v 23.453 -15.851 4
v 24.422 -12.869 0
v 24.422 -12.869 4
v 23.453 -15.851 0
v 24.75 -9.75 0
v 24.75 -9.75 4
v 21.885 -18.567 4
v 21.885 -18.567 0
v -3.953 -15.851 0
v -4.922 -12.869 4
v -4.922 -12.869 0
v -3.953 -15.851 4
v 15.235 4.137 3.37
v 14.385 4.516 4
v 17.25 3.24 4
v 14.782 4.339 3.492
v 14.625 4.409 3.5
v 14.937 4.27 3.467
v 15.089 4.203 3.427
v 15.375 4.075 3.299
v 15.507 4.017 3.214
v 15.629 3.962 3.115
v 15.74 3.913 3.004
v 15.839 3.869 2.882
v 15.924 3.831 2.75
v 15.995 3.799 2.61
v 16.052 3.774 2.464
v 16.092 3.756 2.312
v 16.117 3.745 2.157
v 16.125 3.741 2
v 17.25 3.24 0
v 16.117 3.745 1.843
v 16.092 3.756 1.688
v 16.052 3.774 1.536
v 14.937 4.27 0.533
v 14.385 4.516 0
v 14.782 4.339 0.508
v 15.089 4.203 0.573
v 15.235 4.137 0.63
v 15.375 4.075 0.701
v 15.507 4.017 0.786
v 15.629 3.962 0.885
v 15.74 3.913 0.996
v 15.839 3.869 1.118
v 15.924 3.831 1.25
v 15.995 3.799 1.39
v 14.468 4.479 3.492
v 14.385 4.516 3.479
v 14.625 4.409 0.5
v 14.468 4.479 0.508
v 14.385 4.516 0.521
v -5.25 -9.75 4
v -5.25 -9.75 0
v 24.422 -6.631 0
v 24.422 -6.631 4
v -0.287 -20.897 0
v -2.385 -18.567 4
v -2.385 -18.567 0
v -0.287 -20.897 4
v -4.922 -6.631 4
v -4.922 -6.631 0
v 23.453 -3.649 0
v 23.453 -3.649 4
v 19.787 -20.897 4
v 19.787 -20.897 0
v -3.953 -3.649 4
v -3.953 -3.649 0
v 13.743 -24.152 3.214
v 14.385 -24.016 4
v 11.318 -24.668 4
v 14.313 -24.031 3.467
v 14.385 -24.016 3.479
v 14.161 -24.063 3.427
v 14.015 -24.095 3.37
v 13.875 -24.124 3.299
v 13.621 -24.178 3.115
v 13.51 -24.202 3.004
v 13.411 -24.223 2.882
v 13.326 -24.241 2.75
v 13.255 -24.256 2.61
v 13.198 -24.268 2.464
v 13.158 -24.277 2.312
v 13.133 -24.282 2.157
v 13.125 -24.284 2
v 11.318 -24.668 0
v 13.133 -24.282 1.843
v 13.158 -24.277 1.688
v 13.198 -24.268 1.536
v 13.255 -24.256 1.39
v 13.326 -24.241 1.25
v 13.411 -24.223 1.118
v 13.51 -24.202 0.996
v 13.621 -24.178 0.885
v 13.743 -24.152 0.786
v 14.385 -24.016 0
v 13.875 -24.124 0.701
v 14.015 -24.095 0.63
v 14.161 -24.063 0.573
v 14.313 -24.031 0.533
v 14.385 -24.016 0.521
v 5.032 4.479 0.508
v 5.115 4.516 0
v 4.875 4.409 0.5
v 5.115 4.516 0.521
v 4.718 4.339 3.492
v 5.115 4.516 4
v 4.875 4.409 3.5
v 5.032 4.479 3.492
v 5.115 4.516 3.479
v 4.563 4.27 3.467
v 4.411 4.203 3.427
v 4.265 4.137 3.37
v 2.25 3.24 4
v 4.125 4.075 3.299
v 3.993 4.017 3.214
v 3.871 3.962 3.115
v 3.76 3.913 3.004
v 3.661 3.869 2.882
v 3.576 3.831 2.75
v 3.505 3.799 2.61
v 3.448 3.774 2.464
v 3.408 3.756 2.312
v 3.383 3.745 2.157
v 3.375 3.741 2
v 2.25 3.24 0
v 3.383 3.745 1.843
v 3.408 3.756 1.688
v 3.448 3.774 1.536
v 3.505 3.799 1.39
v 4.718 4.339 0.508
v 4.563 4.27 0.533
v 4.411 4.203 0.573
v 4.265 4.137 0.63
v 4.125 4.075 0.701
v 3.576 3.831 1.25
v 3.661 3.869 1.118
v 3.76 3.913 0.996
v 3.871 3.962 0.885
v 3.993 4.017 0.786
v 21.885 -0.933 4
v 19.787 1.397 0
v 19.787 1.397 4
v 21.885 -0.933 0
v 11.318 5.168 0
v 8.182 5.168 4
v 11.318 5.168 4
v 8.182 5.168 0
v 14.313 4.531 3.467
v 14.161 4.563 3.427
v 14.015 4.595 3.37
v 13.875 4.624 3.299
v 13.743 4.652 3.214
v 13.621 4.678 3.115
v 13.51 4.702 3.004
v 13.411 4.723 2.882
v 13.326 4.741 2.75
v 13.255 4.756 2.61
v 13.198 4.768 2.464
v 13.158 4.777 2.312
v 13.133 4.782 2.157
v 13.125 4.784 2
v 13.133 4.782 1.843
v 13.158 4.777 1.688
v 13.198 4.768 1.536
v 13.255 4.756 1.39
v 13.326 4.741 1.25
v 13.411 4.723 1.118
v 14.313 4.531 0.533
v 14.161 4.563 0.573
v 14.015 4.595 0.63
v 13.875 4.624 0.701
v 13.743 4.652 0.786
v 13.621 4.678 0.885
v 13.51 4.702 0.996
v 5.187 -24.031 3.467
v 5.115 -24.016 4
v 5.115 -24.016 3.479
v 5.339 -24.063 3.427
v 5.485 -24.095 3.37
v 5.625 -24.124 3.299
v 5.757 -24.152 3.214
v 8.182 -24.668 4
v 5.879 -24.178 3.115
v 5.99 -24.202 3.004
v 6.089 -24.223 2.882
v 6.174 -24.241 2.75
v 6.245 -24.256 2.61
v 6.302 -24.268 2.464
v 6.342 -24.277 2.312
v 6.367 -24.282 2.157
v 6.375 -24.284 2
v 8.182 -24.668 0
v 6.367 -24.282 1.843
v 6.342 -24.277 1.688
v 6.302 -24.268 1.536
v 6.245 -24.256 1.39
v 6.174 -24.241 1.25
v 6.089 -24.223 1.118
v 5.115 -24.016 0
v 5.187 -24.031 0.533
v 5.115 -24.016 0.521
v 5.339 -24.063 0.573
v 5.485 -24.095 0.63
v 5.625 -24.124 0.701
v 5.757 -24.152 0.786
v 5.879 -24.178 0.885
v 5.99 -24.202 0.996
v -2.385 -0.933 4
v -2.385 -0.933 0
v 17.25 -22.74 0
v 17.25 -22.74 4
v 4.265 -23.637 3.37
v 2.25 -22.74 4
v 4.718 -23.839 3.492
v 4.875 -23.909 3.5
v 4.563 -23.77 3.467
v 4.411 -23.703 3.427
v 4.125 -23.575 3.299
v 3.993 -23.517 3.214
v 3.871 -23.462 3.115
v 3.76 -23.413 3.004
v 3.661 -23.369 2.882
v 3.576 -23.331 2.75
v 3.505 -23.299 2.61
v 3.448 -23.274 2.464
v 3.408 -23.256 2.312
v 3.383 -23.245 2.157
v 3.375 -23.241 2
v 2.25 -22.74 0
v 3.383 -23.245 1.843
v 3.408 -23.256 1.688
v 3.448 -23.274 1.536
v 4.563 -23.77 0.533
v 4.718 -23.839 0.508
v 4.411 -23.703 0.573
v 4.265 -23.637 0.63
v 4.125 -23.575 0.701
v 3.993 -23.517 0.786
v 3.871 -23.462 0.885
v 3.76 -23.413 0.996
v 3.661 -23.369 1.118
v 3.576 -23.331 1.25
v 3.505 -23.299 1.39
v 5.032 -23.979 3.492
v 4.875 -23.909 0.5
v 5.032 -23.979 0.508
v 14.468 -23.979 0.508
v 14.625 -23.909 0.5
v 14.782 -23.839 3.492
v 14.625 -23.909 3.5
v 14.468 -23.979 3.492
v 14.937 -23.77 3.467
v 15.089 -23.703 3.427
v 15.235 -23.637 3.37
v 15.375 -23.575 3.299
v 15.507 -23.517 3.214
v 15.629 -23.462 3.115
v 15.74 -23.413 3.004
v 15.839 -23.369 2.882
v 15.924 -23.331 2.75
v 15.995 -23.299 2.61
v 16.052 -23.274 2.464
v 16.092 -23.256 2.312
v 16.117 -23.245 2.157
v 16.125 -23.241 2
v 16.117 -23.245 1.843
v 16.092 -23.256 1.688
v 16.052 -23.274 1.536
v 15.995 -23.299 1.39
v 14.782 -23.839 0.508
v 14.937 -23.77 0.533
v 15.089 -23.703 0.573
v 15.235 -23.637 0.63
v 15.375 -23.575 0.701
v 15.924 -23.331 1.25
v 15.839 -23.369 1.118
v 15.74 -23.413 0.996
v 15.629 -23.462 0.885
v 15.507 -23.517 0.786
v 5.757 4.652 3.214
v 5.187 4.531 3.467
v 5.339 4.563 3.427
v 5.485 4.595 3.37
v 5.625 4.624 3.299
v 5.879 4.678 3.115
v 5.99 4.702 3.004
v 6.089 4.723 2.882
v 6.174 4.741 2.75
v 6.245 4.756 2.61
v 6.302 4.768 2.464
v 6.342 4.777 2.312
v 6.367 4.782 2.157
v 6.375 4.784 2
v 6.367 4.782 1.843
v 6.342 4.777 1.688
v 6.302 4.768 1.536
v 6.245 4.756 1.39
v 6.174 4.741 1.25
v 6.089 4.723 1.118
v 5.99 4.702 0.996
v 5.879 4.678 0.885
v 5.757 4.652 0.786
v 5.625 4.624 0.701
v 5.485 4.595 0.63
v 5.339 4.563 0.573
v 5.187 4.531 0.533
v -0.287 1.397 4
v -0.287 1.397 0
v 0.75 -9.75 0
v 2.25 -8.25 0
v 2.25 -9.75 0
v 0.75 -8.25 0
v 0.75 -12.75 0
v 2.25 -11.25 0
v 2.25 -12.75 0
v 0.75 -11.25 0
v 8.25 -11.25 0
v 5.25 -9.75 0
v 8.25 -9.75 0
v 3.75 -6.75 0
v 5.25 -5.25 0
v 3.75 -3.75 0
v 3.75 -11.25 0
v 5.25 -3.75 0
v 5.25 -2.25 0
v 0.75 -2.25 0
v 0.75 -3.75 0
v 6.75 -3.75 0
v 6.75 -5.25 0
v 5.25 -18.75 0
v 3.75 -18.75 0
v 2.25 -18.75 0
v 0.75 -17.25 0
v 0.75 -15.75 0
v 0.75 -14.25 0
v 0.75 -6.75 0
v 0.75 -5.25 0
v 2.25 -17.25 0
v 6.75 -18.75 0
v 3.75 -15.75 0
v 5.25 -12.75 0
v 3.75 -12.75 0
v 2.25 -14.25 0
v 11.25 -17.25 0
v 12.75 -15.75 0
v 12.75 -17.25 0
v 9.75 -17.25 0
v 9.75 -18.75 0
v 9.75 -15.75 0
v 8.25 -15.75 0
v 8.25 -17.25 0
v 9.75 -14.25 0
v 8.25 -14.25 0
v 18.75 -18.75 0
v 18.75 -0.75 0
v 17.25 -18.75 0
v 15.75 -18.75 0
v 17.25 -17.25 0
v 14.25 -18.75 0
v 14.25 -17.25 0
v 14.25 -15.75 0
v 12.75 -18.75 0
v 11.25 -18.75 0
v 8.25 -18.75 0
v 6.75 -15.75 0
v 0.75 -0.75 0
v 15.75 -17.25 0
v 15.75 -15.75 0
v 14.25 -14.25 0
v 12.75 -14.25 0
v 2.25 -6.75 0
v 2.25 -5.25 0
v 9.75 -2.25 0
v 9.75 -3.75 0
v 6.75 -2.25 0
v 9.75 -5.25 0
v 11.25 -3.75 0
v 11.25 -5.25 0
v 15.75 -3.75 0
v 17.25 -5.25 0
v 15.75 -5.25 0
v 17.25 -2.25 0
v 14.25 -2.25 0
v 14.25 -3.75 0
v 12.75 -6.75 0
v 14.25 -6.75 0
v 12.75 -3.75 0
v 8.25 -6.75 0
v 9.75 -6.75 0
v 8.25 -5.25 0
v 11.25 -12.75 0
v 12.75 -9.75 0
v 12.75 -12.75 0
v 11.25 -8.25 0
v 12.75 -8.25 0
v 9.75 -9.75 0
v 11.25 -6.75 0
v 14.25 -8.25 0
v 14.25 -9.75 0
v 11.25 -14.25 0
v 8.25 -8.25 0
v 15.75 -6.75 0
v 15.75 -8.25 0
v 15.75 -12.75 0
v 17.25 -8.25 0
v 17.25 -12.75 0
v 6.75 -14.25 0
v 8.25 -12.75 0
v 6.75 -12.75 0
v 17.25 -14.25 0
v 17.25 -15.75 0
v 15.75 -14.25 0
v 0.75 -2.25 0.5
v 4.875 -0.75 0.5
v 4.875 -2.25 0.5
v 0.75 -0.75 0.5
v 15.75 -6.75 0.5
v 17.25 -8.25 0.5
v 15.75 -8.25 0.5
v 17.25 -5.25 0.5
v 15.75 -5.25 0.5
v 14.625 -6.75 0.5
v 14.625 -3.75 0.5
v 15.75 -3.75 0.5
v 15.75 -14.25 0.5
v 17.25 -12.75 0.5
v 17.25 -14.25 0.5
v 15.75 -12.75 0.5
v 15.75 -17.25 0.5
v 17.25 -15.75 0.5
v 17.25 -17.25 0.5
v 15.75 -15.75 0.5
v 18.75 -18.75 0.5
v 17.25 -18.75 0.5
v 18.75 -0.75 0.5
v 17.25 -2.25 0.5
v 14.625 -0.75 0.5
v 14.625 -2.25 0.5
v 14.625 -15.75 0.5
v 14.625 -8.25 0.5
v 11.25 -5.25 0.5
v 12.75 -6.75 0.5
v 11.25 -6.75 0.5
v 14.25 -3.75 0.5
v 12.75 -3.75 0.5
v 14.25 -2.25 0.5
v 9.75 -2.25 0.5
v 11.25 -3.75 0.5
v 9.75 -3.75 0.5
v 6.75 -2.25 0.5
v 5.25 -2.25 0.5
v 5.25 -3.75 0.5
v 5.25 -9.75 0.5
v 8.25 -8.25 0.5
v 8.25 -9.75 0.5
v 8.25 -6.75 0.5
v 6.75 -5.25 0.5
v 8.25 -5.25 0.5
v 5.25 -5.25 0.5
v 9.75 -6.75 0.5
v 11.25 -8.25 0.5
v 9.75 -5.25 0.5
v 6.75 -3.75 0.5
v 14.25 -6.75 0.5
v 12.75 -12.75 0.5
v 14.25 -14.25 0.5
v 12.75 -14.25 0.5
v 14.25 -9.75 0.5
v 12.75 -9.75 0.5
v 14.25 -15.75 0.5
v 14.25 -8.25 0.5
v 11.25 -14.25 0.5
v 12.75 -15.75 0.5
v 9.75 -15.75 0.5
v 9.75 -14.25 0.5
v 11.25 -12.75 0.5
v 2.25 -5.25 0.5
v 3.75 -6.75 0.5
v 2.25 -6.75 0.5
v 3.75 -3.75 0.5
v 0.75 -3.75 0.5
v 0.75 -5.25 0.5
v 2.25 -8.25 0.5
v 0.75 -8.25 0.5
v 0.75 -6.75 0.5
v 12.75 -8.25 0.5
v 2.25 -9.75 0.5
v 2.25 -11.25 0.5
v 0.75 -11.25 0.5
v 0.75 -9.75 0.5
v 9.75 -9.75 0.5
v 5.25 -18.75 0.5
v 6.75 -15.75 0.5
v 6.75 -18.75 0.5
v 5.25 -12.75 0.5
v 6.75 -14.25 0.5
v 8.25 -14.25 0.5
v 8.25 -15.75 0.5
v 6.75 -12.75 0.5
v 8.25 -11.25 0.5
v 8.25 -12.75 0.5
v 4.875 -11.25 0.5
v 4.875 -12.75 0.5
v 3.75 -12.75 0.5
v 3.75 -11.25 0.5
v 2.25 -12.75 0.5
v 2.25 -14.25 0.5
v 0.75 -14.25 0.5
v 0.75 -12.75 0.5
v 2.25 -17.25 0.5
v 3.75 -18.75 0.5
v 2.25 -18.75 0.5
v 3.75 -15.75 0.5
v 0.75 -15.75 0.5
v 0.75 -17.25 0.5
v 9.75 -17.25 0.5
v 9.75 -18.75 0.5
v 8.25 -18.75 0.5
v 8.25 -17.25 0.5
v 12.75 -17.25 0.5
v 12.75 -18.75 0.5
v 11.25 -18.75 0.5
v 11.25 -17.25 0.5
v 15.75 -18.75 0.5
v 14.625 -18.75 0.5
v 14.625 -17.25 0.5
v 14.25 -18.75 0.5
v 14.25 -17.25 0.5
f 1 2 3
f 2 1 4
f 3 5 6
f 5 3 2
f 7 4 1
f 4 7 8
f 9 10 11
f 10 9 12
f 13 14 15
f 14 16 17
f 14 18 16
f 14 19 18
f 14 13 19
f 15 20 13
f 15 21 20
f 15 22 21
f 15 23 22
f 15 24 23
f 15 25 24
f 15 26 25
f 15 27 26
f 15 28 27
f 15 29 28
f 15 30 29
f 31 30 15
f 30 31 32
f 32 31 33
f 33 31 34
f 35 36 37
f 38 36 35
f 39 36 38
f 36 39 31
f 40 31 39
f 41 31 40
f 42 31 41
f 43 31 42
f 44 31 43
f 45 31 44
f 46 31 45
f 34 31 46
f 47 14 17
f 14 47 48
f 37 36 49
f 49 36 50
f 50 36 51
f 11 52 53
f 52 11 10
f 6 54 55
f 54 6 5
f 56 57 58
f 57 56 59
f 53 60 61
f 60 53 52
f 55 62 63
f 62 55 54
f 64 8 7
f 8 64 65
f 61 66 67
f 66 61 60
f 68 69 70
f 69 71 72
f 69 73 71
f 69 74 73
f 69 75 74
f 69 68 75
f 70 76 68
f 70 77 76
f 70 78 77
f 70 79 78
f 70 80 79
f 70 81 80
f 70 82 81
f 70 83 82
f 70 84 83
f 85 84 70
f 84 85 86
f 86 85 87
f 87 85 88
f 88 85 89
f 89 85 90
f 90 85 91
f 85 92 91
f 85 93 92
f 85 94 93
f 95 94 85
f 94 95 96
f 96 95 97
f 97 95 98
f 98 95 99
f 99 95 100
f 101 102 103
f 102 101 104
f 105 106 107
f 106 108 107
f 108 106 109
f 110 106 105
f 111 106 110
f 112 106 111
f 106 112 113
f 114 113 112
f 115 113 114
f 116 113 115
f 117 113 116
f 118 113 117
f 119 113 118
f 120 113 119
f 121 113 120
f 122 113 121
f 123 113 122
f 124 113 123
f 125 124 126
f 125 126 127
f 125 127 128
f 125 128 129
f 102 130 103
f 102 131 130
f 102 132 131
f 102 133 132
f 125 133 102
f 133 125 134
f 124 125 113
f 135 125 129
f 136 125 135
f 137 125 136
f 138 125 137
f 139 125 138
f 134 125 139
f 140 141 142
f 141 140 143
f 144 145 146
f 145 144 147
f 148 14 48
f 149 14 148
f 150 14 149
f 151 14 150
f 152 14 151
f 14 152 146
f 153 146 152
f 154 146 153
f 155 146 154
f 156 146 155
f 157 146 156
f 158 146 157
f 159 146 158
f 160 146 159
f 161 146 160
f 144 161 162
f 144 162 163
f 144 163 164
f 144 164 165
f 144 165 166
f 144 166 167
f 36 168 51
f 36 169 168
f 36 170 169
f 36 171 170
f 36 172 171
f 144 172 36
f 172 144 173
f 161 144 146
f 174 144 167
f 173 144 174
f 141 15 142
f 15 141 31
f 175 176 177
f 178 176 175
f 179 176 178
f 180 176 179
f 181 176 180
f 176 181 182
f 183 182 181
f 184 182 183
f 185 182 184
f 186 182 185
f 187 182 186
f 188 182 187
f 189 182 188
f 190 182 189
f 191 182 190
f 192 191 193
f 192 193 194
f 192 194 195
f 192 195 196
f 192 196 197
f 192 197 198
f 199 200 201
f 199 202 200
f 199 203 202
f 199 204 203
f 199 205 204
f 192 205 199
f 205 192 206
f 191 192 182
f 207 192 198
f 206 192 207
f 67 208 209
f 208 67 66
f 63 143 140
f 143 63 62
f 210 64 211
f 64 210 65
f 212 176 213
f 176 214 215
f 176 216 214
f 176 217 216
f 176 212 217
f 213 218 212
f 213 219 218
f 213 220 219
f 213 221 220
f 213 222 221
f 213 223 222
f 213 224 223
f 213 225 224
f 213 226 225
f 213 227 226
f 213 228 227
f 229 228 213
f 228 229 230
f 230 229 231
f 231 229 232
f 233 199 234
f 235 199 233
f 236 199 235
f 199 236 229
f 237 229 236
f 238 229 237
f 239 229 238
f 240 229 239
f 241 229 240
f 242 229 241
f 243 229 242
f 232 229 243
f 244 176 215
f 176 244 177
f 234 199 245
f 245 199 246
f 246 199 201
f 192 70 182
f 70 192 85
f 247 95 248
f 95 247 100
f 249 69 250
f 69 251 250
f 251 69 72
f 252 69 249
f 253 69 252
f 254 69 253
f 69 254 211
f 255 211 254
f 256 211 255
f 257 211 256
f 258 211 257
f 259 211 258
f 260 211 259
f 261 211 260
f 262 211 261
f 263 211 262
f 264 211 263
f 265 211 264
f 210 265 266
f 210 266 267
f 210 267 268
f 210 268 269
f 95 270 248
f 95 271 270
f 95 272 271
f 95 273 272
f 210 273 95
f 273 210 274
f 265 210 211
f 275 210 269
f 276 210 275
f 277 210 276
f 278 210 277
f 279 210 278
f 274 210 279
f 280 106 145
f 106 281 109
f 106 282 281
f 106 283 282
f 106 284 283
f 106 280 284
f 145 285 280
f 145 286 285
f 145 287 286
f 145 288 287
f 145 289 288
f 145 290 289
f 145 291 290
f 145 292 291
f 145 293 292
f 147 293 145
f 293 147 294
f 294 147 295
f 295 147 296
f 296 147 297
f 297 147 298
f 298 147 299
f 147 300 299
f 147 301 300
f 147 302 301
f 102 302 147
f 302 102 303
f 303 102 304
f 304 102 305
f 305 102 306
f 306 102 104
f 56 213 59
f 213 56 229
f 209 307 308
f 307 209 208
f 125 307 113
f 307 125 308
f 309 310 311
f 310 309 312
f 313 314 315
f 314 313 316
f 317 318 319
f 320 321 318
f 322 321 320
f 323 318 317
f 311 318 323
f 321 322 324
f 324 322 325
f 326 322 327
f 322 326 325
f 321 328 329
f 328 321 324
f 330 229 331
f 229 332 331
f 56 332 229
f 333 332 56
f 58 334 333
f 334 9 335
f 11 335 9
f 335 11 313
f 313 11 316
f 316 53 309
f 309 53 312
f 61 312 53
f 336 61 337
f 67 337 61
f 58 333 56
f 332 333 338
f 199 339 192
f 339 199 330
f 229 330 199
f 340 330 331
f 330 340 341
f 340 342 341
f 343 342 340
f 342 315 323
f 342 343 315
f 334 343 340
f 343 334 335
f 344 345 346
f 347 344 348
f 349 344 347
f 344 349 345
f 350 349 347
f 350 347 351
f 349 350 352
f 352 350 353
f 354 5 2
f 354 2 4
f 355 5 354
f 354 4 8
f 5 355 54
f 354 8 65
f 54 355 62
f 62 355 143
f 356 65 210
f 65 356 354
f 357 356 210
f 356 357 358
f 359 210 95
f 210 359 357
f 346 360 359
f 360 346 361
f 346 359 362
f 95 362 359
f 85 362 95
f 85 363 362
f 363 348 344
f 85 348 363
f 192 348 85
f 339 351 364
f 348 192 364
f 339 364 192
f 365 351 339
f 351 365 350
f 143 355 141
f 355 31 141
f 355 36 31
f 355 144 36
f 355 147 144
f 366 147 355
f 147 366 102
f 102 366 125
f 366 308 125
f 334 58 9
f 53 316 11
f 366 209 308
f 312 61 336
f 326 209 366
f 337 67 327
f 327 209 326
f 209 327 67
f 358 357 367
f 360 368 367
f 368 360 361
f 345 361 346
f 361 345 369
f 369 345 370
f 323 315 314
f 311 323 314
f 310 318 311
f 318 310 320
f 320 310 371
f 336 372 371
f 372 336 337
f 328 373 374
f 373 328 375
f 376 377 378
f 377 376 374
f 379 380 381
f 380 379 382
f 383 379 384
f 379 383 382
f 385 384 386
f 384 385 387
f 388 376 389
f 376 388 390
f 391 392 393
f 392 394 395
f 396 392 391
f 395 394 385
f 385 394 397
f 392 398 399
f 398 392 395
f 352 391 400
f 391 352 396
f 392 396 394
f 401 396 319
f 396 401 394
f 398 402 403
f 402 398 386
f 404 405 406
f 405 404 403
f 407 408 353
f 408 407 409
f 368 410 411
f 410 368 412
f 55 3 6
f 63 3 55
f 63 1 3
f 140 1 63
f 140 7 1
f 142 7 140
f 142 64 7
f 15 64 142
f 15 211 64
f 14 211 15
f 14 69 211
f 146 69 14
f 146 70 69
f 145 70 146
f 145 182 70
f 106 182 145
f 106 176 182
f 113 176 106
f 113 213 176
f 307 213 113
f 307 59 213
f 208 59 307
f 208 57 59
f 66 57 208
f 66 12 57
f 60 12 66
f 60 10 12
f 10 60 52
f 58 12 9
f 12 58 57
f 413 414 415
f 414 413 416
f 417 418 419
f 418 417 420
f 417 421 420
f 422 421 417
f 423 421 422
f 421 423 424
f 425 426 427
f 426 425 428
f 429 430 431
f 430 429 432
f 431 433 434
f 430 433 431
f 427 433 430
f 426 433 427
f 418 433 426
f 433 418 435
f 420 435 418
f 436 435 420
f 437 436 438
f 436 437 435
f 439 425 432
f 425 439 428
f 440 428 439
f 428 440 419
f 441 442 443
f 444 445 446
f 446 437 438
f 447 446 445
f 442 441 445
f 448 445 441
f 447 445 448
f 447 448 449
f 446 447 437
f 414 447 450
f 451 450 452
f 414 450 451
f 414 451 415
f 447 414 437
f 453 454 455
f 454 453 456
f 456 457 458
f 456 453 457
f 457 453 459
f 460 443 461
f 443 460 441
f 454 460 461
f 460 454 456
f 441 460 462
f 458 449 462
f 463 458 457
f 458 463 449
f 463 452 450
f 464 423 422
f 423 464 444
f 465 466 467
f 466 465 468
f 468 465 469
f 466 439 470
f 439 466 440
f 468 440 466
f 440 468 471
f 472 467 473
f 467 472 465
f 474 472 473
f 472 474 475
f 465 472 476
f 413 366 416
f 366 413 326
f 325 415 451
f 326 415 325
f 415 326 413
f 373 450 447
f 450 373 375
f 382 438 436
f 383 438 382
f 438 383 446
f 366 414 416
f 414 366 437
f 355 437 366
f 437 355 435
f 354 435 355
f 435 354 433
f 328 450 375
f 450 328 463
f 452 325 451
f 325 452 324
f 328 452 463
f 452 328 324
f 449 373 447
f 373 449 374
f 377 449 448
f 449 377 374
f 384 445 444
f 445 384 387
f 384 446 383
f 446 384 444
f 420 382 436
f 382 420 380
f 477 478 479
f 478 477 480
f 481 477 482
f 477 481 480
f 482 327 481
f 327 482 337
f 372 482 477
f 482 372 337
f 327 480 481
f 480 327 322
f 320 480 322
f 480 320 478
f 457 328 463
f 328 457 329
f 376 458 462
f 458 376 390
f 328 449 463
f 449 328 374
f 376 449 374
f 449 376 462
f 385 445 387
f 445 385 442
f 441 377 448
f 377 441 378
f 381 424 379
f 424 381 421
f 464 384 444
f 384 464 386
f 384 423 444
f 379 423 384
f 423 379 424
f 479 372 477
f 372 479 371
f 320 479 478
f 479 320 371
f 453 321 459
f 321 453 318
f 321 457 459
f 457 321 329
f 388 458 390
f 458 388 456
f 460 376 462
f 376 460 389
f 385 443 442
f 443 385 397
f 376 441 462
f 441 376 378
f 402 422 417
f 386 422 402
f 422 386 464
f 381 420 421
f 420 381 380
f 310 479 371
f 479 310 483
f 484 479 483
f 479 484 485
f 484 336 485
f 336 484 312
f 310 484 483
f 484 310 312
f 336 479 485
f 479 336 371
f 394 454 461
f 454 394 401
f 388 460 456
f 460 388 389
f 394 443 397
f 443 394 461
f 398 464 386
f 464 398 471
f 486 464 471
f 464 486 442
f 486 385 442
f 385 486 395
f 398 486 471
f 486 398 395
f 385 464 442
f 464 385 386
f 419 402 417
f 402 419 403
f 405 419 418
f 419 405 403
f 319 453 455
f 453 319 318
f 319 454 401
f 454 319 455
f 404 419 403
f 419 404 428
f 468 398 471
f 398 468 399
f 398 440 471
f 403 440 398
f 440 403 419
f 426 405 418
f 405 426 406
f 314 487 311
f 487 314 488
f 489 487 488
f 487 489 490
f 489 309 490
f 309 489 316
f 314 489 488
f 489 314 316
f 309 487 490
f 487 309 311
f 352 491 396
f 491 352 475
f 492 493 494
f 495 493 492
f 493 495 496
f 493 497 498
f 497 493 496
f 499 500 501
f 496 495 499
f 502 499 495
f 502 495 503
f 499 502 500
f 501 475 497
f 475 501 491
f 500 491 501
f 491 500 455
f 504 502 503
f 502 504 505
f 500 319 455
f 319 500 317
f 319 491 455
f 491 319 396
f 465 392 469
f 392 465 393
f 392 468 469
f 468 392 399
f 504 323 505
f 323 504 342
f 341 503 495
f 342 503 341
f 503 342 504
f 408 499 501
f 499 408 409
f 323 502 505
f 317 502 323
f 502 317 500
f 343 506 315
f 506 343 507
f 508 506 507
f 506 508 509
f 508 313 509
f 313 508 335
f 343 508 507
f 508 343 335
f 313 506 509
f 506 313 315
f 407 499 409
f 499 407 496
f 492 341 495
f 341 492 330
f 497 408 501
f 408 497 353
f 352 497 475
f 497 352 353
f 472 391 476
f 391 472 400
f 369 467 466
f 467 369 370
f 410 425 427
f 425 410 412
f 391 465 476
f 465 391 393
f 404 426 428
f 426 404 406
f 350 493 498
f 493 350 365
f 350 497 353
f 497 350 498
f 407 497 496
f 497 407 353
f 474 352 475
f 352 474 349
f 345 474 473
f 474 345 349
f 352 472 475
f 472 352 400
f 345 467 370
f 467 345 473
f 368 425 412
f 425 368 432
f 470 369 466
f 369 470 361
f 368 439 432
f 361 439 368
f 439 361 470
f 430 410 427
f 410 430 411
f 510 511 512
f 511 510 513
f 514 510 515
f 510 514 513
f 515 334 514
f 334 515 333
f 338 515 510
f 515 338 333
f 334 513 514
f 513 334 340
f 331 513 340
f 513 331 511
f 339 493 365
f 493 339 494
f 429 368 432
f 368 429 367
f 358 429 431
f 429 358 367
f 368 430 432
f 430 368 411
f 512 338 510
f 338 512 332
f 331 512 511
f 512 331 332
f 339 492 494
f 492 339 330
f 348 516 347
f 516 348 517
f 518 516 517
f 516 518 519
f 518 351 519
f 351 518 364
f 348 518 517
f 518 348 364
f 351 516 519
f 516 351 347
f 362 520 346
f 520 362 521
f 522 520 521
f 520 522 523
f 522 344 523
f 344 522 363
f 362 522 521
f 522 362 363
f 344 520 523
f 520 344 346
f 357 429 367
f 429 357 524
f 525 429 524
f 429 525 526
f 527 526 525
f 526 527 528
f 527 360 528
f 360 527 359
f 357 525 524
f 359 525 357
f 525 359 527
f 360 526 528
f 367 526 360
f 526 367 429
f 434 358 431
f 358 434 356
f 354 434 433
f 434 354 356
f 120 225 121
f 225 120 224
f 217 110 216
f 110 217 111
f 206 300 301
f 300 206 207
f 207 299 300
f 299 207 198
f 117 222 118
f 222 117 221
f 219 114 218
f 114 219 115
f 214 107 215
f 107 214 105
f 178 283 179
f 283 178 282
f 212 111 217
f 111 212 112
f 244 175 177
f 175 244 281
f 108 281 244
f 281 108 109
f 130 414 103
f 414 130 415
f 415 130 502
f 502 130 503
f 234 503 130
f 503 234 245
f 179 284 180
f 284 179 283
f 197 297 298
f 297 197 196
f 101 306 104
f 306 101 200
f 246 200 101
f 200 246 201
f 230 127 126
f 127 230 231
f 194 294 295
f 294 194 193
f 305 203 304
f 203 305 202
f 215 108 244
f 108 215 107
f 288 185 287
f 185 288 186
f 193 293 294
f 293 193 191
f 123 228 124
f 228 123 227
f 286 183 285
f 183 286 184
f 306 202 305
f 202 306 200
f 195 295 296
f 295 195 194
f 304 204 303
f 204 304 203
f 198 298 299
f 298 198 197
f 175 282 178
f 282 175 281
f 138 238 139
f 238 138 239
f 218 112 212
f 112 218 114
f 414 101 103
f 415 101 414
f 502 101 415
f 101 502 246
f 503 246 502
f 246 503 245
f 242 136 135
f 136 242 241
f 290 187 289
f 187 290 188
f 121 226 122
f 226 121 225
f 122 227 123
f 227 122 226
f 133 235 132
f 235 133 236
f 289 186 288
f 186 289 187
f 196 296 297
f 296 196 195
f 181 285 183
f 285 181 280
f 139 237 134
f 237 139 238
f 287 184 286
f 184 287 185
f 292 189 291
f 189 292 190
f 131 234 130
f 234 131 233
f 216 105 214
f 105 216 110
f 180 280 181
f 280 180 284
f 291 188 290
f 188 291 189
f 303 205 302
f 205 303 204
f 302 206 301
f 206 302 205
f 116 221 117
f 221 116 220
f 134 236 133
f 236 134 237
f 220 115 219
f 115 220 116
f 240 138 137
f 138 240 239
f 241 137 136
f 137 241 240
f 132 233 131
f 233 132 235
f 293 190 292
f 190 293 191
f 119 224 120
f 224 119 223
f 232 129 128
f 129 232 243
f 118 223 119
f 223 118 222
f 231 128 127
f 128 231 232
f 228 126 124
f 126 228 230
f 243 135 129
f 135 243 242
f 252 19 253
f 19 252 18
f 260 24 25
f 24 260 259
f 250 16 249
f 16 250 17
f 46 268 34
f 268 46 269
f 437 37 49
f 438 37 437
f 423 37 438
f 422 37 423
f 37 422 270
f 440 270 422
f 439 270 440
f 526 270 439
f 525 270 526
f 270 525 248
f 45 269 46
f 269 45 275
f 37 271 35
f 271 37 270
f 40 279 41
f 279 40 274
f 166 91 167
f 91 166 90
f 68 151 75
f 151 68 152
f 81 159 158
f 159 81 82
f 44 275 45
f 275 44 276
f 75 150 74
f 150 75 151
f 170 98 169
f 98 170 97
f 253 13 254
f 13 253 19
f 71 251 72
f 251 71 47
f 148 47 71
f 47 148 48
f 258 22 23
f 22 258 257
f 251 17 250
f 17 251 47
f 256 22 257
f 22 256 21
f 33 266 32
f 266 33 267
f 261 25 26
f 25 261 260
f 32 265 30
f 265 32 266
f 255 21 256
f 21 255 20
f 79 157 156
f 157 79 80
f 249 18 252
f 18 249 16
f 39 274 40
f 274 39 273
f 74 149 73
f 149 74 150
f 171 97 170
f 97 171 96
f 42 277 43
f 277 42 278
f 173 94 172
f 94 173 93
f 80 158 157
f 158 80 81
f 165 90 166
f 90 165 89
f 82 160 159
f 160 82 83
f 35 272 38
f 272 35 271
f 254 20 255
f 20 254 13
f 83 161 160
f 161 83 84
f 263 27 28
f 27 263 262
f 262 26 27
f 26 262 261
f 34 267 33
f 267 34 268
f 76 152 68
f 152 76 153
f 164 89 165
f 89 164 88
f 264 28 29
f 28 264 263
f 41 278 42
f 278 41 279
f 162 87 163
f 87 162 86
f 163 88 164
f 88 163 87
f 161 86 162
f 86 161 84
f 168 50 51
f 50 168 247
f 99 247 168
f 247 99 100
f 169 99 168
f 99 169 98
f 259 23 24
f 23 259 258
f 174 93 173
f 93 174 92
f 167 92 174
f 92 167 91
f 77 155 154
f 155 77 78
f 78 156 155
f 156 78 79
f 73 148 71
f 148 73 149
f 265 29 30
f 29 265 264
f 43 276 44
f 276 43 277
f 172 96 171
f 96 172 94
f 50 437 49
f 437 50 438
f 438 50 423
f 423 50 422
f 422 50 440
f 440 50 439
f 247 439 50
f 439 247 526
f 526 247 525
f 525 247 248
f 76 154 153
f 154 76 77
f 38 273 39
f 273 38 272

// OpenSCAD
rotate([180,0,0])difference(){translate([9.75,9.75,-2])  cylinder(r=15,h=4, center=true);
translate([1.5,1.5,0])  cube(size = [1.5,1.5,1], center=true);
translate([3,1.5,0])  cube(size = [1.5,1.5,1], center=true);
translate([4.5,1.5,0])  cube(size = [1.5,1.5,1], center=true);
translate([6,1.5,0])  cube(size = [1.5,1.5,1], center=true);
translate([7.5,1.5,0])  cube(size = [1.5,1.5,1], center=true);
translate([9,1.5,0])  cube(size = [1.5,1.5,1], center=true);
translate([10.5,1.5,0])  cube(size = [1.5,1.5,1], center=true);
translate([12,1.5,0])  cube(size = [1.5,1.5,1], center=true);
translate([13.5,1.5,0])  cube(size = [1.5,1.5,1], center=true);
translate([15,1.5,0])  cube(size = [1.5,1.5,1], center=true);
translate([16.5,1.5,0])  cube(size = [1.5,1.5,1], center=true);
translate([18,1.5,0])  cube(size = [1.5,1.5,1], center=true);
translate([18,1.5,0])  cube(size = [1.5,1.5,1], center=true);
translate([18,1.5,0])  cube(size = [1.5,1.5,1], center=true);
translate([18,1.5,0])  cube(size = [1.5,1.5,1], center=true);
translate([6,3,0])  cube(size = [1.5,1.5,1], center=true);
translate([6,3,0])  cube(size = [1.5,1.5,1], center=true);
translate([6,3,0])  cube(size = [1.5,1.5,1], center=true);
translate([10.5,3,0])  cube(size = [1.5,1.5,1], center=true);
translate([12,3,0])  cube(size = [1.5,1.5,1], center=true);
translate([13.5,3,0])  cube(size = [1.5,1.5,1], center=true);
translate([13.5,3,0])  cube(size = [1.5,1.5,1], center=true);
translate([13.5,3,0])  cube(size = [1.5,1.5,1], center=true);
translate([18,3,0])  cube(size = [1.5,1.5,1], center=true);
translate([1.5,4.5,0])  cube(size = [1.5,1.5,1], center=true);
translate([3,4.5,0])  cube(size = [1.5,1.5,1], center=true);
translate([3,4.5,0])  cube(size = [1.5,1.5,1], center=true);
translate([3,4.5,0])  cube(size = [1.5,1.5,1], center=true);
translate([7.5,4.5,0])  cube(size = [1.5,1.5,1], center=true);
translate([9,4.5,0])  cube(size = [1.5,1.5,1], center=true);
translate([9,4.5,0])  cube(size = [1.5,1.5,1], center=true);
translate([12,4.5,0])  cube(size = [1.5,1.5,1], center=true);
translate([12,4.5,0])  cube(size = [1.5,1.5,1], center=true);
translate([15,4.5,0])  cube(size = [1.5,1.5,1], center=true);
translate([15,4.5,0])  cube(size = [1.5,1.5,1], center=true);
translate([18,4.5,0])  cube(size = [1.5,1.5,1], center=true);
translate([18,4.5,0])  cube(size = [1.5,1.5,1], center=true);
translate([3,6,0])  cube(size = [1.5,1.5,1], center=true);
translate([3,6,0])  cube(size = [1.5,1.5,1], center=true);
translate([6,6,0])  cube(size = [1.5,1.5,1], center=true);
translate([7.5,6,0])  cube(size = [1.5,1.5,1], center=true);
translate([7.5,6,0])  cube(size = [1.5,1.5,1], center=true);
translate([10.5,6,0])  cube(size = [1.5,1.5,1], center=true);
translate([12,6,0])  cube(size = [1.5,1.5,1], center=true);
translate([12,6,0])  cube(size = [1.5,1.5,1], center=true);
translate([15,6,0])  cube(size = [1.5,1.5,1], center=true);
translate([16.5,6,0])  cube(size = [1.5,1.5,1], center=true);
translate([18,6,0])  cube(size = [1.5,1.5,1], center=true);
translate([1.5,7.5,0])  cube(size = [1.5,1.5,1], center=true);
translate([1.5,7.5,0])  cube(size = [1.5,1.5,1], center=true);
translate([1.5,7.5,0])  cube(size = [1.5,1.5,1], center=true);
translate([6,7.5,0])  cube(size = [1.5,1.5,1], center=true);
translate([7.5,7.5,0])  cube(size = [1.5,1.5,1], center=true);
translate([9,7.5,0])  cube(size = [1.5,1.5,1], center=true);
translate([10.5,7.5,0])  cube(size = [1.5,1.5,1], center=true);
translate([10.5,7.5,0])  cube(size = [1.5,1.5,1], center=true);
translate([13.5,7.5,0])  cube(size = [1.5,1.5,1], center=true);
translate([13.5,7.5,0])  cube(size = [1.5,1.5,1], center=true);
translate([16.5,7.5,0])  cube(size = [1.5,1.5,1], center=true);
translate([18,7.5,0])  cube(size = [1.5,1.5,1], center=true);
translate([18,7.5,0])  cube(size = [1.5,1.5,1], center=true);
translate([18,7.5,0])  cube(size = [1.5,1.5,1], center=true);
translate([18,7.5,0])  cube(size = [1.5,1.5,1], center=true);
translate([6,9,0])  cube(size = [1.5,1.5,1], center=true);
translate([7.5,9,0])  cube(size = [1.5,1.5,1], center=true);
translate([7.5,9,0])  cube(size = [1.5,1.5,1], center=true);
translate([7.5,9,0])  cube(size = [1.5,1.5,1], center=true);
translate([7.5,9,0])  cube(size = [1.5,1.5,1], center=true);
translate([7.5,9,0])  cube(size = [1.5,1.5,1], center=true);
translate([15,9,0])  cube(size = [1.5,1.5,1], center=true);
translate([15,9,0])  cube(size = [1.5,1.5,1], center=true);
translate([18,9,0])  cube(size = [1.5,1.5,1], center=true);
translate([1.5,10.5,0])  cube(size = [1.5,1.5,1], center=true);
translate([1.5,10.5,0])  cube(size = [1.5,1.5,1], center=true);
translate([1.5,10.5,0])  cube(size = [1.5,1.5,1], center=true);
translate([1.5,10.5,0])  cube(size = [1.5,1.5,1], center=true);
translate([1.5,10.5,0])  cube(size = [1.5,1.5,1], center=true);
translate([9,10.5,0])  cube(size = [1.5,1.5,1], center=true);
translate([9,10.5,0])  cube(size = [1.5,1.5,1], center=true);
translate([9,10.5,0])  cube(size = [1.5,1.5,1], center=true);
translate([13.5,10.5,0])  cube(size = [1.5,1.5,1], center=true);
translate([15,10.5,0])  cube(size = [1.5,1.5,1], center=true);
translate([15,10.5,0])  cube(size = [1.5,1.5,1], center=true);
translate([18,10.5,0])  cube(size = [1.5,1.5,1], center=true);
translate([18,10.5,0])  cube(size = [1.5,1.5,1], center=true);
translate([18,10.5,0])  cube(size = [1.5,1.5,1], center=true);
translate([4.5,12,0])  cube(size = [1.5,1.5,1], center=true);
translate([6,12,0])  cube(size = [1.5,1.5,1], center=true);
translate([7.5,12,0])  cube(size = [1.5,1.5,1], center=true);
translate([9,12,0])  cube(size = [1.5,1.5,1], center=true);
translate([9,12,0])  cube(size = [1.5,1.5,1], center=true);
translate([9,12,0])  cube(size = [1.5,1.5,1], center=true);
translate([13.5,12,0])  cube(size = [1.5,1.5,1], center=true);
translate([15,12,0])  cube(size = [1.5,1.5,1], center=true);
translate([15,12,0])  cube(size = [1.5,1.5,1], center=true);
translate([18,12,0])  cube(size = [1.5,1.5,1], center=true);
translate([1.5,13.5,0])  cube(size = [1.5,1.5,1], center=true);
translate([1.5,13.5,0])  cube(size = [1.5,1.5,1], center=true);
translate([1.5,13.5,0])  cube(size = [1.5,1.5,1], center=true);
translate([6,13.5,0])  cube(size = [1.5,1.5,1], center=true);
translate([6,13.5,0])  cube(size = [1.5,1.5,1], center=true);
translate([9,13.5,0])  cube(size = [1.5,1.5,1], center=true);
translate([9,13.5,0])  cube(size = [1.5,1.5,1], center=true);
translate([12,13.5,0])  cube(size = [1.5,1.5,1], center=true);
translate([13.5,13.5,0])  cube(size = [1.5,1.5,1], center=true);
translate([15,13.5,0])  cube(size = [1.5,1.5,1], center=true);
translate([16.5,13.5,0])  cube(size = [1.5,1.5,1], center=true);
translate([18,13.5,0])  cube(size = [1.5,1.5,1], center=true);
translate([18,13.5,0])  cube(size = [1.5,1.5,1], center=true);
translate([18,13.5,0])  cube(size = [1.5,1.5,1], center=true);
translate([18,13.5,0])  cube(size = [1.5,1.5,1], center=true);
translate([6,15,0])  cube(size = [1.5,1.5,1], center=true);
translate([7.5,15,0])  cube(size = [1.5,1.5,1], center=true);
translate([7.5,15,0])  cube(size = [1.5,1.5,1], center=true);
translate([10.5,15,0])  cube(size = [1.5,1.5,1], center=true);
translate([12,15,0])  cube(size = [1.5,1.5,1], center=true);
translate([12,15,0])  cube(size = [1.5,1.5,1], center=true);
translate([15,15,0])  cube(size = [1.5,1.5,1], center=true);
translate([15,15,0])  cube(size = [1.5,1.5,1], center=true);
translate([18,15,0])  cube(size = [1.5,1.5,1], center=true);
translate([1.5,16.5,0])  cube(size = [1.5,1.5,1], center=true);
translate([3,16.5,0])  cube(size = [1.5,1.5,1], center=true);
translate([3,16.5,0])  cube(size = [1.5,1.5,1], center=true);
translate([6,16.5,0])  cube(size = [1.5,1.5,1], center=true);
translate([6,16.5,0])  cube(size = [1.5,1.5,1], center=true);
translate([6,16.5,0])  cube(size = [1.5,1.5,1], center=true);
translate([6,16.5,0])  cube(size = [1.5,1.5,1], center=true);
translate([6,16.5,0])  cube(size = [1.5,1.5,1], center=true);
translate([6,16.5,0])  cube(size = [1.5,1.5,1], center=true);
translate([6,16.5,0])  cube(size = [1.5,1.5,1], center=true);
translate([16.5,16.5,0])  cube(size = [1.5,1.5,1], center=true);
translate([18,16.5,0])  cube(size = [1.5,1.5,1], center=true);
translate([18,16.5,0])  cube(size = [1.5,1.5,1], center=true);
translate([3,18,0])  cube(size = [1.5,1.5,1], center=true);
translate([3,18,0])  cube(size = [1.5,1.5,1], center=true);
translate([6,18,0])  cube(size = [1.5,1.5,1], center=true);
translate([6,18,0])  cube(size = [1.5,1.5,1], center=true);
translate([9,18,0])  cube(size = [1.5,1.5,1], center=true);
translate([9,18,0])  cube(size = [1.5,1.5,1], center=true);
translate([12,18,0])  cube(size = [1.5,1.5,1], center=true);
translate([12,18,0])  cube(size = [1.5,1.5,1], center=true);
translate([15,18,0])  cube(size = [1.5,1.5,1], center=true);
translate([15,18,0])  cube(size = [1.5,1.5,1], center=true);
translate([18,18,0])  cube(size = [1.5,1.5,1], center=true);
rotate([90,90,0])translate([2,4.875,0])  cylinder(r=1.5,h=400, $fn=60, center=true);
rotate([90,90,0])translate([2,14.625,0])  cylinder(r=1.5,h=400, $fn=60, center=true);
}
